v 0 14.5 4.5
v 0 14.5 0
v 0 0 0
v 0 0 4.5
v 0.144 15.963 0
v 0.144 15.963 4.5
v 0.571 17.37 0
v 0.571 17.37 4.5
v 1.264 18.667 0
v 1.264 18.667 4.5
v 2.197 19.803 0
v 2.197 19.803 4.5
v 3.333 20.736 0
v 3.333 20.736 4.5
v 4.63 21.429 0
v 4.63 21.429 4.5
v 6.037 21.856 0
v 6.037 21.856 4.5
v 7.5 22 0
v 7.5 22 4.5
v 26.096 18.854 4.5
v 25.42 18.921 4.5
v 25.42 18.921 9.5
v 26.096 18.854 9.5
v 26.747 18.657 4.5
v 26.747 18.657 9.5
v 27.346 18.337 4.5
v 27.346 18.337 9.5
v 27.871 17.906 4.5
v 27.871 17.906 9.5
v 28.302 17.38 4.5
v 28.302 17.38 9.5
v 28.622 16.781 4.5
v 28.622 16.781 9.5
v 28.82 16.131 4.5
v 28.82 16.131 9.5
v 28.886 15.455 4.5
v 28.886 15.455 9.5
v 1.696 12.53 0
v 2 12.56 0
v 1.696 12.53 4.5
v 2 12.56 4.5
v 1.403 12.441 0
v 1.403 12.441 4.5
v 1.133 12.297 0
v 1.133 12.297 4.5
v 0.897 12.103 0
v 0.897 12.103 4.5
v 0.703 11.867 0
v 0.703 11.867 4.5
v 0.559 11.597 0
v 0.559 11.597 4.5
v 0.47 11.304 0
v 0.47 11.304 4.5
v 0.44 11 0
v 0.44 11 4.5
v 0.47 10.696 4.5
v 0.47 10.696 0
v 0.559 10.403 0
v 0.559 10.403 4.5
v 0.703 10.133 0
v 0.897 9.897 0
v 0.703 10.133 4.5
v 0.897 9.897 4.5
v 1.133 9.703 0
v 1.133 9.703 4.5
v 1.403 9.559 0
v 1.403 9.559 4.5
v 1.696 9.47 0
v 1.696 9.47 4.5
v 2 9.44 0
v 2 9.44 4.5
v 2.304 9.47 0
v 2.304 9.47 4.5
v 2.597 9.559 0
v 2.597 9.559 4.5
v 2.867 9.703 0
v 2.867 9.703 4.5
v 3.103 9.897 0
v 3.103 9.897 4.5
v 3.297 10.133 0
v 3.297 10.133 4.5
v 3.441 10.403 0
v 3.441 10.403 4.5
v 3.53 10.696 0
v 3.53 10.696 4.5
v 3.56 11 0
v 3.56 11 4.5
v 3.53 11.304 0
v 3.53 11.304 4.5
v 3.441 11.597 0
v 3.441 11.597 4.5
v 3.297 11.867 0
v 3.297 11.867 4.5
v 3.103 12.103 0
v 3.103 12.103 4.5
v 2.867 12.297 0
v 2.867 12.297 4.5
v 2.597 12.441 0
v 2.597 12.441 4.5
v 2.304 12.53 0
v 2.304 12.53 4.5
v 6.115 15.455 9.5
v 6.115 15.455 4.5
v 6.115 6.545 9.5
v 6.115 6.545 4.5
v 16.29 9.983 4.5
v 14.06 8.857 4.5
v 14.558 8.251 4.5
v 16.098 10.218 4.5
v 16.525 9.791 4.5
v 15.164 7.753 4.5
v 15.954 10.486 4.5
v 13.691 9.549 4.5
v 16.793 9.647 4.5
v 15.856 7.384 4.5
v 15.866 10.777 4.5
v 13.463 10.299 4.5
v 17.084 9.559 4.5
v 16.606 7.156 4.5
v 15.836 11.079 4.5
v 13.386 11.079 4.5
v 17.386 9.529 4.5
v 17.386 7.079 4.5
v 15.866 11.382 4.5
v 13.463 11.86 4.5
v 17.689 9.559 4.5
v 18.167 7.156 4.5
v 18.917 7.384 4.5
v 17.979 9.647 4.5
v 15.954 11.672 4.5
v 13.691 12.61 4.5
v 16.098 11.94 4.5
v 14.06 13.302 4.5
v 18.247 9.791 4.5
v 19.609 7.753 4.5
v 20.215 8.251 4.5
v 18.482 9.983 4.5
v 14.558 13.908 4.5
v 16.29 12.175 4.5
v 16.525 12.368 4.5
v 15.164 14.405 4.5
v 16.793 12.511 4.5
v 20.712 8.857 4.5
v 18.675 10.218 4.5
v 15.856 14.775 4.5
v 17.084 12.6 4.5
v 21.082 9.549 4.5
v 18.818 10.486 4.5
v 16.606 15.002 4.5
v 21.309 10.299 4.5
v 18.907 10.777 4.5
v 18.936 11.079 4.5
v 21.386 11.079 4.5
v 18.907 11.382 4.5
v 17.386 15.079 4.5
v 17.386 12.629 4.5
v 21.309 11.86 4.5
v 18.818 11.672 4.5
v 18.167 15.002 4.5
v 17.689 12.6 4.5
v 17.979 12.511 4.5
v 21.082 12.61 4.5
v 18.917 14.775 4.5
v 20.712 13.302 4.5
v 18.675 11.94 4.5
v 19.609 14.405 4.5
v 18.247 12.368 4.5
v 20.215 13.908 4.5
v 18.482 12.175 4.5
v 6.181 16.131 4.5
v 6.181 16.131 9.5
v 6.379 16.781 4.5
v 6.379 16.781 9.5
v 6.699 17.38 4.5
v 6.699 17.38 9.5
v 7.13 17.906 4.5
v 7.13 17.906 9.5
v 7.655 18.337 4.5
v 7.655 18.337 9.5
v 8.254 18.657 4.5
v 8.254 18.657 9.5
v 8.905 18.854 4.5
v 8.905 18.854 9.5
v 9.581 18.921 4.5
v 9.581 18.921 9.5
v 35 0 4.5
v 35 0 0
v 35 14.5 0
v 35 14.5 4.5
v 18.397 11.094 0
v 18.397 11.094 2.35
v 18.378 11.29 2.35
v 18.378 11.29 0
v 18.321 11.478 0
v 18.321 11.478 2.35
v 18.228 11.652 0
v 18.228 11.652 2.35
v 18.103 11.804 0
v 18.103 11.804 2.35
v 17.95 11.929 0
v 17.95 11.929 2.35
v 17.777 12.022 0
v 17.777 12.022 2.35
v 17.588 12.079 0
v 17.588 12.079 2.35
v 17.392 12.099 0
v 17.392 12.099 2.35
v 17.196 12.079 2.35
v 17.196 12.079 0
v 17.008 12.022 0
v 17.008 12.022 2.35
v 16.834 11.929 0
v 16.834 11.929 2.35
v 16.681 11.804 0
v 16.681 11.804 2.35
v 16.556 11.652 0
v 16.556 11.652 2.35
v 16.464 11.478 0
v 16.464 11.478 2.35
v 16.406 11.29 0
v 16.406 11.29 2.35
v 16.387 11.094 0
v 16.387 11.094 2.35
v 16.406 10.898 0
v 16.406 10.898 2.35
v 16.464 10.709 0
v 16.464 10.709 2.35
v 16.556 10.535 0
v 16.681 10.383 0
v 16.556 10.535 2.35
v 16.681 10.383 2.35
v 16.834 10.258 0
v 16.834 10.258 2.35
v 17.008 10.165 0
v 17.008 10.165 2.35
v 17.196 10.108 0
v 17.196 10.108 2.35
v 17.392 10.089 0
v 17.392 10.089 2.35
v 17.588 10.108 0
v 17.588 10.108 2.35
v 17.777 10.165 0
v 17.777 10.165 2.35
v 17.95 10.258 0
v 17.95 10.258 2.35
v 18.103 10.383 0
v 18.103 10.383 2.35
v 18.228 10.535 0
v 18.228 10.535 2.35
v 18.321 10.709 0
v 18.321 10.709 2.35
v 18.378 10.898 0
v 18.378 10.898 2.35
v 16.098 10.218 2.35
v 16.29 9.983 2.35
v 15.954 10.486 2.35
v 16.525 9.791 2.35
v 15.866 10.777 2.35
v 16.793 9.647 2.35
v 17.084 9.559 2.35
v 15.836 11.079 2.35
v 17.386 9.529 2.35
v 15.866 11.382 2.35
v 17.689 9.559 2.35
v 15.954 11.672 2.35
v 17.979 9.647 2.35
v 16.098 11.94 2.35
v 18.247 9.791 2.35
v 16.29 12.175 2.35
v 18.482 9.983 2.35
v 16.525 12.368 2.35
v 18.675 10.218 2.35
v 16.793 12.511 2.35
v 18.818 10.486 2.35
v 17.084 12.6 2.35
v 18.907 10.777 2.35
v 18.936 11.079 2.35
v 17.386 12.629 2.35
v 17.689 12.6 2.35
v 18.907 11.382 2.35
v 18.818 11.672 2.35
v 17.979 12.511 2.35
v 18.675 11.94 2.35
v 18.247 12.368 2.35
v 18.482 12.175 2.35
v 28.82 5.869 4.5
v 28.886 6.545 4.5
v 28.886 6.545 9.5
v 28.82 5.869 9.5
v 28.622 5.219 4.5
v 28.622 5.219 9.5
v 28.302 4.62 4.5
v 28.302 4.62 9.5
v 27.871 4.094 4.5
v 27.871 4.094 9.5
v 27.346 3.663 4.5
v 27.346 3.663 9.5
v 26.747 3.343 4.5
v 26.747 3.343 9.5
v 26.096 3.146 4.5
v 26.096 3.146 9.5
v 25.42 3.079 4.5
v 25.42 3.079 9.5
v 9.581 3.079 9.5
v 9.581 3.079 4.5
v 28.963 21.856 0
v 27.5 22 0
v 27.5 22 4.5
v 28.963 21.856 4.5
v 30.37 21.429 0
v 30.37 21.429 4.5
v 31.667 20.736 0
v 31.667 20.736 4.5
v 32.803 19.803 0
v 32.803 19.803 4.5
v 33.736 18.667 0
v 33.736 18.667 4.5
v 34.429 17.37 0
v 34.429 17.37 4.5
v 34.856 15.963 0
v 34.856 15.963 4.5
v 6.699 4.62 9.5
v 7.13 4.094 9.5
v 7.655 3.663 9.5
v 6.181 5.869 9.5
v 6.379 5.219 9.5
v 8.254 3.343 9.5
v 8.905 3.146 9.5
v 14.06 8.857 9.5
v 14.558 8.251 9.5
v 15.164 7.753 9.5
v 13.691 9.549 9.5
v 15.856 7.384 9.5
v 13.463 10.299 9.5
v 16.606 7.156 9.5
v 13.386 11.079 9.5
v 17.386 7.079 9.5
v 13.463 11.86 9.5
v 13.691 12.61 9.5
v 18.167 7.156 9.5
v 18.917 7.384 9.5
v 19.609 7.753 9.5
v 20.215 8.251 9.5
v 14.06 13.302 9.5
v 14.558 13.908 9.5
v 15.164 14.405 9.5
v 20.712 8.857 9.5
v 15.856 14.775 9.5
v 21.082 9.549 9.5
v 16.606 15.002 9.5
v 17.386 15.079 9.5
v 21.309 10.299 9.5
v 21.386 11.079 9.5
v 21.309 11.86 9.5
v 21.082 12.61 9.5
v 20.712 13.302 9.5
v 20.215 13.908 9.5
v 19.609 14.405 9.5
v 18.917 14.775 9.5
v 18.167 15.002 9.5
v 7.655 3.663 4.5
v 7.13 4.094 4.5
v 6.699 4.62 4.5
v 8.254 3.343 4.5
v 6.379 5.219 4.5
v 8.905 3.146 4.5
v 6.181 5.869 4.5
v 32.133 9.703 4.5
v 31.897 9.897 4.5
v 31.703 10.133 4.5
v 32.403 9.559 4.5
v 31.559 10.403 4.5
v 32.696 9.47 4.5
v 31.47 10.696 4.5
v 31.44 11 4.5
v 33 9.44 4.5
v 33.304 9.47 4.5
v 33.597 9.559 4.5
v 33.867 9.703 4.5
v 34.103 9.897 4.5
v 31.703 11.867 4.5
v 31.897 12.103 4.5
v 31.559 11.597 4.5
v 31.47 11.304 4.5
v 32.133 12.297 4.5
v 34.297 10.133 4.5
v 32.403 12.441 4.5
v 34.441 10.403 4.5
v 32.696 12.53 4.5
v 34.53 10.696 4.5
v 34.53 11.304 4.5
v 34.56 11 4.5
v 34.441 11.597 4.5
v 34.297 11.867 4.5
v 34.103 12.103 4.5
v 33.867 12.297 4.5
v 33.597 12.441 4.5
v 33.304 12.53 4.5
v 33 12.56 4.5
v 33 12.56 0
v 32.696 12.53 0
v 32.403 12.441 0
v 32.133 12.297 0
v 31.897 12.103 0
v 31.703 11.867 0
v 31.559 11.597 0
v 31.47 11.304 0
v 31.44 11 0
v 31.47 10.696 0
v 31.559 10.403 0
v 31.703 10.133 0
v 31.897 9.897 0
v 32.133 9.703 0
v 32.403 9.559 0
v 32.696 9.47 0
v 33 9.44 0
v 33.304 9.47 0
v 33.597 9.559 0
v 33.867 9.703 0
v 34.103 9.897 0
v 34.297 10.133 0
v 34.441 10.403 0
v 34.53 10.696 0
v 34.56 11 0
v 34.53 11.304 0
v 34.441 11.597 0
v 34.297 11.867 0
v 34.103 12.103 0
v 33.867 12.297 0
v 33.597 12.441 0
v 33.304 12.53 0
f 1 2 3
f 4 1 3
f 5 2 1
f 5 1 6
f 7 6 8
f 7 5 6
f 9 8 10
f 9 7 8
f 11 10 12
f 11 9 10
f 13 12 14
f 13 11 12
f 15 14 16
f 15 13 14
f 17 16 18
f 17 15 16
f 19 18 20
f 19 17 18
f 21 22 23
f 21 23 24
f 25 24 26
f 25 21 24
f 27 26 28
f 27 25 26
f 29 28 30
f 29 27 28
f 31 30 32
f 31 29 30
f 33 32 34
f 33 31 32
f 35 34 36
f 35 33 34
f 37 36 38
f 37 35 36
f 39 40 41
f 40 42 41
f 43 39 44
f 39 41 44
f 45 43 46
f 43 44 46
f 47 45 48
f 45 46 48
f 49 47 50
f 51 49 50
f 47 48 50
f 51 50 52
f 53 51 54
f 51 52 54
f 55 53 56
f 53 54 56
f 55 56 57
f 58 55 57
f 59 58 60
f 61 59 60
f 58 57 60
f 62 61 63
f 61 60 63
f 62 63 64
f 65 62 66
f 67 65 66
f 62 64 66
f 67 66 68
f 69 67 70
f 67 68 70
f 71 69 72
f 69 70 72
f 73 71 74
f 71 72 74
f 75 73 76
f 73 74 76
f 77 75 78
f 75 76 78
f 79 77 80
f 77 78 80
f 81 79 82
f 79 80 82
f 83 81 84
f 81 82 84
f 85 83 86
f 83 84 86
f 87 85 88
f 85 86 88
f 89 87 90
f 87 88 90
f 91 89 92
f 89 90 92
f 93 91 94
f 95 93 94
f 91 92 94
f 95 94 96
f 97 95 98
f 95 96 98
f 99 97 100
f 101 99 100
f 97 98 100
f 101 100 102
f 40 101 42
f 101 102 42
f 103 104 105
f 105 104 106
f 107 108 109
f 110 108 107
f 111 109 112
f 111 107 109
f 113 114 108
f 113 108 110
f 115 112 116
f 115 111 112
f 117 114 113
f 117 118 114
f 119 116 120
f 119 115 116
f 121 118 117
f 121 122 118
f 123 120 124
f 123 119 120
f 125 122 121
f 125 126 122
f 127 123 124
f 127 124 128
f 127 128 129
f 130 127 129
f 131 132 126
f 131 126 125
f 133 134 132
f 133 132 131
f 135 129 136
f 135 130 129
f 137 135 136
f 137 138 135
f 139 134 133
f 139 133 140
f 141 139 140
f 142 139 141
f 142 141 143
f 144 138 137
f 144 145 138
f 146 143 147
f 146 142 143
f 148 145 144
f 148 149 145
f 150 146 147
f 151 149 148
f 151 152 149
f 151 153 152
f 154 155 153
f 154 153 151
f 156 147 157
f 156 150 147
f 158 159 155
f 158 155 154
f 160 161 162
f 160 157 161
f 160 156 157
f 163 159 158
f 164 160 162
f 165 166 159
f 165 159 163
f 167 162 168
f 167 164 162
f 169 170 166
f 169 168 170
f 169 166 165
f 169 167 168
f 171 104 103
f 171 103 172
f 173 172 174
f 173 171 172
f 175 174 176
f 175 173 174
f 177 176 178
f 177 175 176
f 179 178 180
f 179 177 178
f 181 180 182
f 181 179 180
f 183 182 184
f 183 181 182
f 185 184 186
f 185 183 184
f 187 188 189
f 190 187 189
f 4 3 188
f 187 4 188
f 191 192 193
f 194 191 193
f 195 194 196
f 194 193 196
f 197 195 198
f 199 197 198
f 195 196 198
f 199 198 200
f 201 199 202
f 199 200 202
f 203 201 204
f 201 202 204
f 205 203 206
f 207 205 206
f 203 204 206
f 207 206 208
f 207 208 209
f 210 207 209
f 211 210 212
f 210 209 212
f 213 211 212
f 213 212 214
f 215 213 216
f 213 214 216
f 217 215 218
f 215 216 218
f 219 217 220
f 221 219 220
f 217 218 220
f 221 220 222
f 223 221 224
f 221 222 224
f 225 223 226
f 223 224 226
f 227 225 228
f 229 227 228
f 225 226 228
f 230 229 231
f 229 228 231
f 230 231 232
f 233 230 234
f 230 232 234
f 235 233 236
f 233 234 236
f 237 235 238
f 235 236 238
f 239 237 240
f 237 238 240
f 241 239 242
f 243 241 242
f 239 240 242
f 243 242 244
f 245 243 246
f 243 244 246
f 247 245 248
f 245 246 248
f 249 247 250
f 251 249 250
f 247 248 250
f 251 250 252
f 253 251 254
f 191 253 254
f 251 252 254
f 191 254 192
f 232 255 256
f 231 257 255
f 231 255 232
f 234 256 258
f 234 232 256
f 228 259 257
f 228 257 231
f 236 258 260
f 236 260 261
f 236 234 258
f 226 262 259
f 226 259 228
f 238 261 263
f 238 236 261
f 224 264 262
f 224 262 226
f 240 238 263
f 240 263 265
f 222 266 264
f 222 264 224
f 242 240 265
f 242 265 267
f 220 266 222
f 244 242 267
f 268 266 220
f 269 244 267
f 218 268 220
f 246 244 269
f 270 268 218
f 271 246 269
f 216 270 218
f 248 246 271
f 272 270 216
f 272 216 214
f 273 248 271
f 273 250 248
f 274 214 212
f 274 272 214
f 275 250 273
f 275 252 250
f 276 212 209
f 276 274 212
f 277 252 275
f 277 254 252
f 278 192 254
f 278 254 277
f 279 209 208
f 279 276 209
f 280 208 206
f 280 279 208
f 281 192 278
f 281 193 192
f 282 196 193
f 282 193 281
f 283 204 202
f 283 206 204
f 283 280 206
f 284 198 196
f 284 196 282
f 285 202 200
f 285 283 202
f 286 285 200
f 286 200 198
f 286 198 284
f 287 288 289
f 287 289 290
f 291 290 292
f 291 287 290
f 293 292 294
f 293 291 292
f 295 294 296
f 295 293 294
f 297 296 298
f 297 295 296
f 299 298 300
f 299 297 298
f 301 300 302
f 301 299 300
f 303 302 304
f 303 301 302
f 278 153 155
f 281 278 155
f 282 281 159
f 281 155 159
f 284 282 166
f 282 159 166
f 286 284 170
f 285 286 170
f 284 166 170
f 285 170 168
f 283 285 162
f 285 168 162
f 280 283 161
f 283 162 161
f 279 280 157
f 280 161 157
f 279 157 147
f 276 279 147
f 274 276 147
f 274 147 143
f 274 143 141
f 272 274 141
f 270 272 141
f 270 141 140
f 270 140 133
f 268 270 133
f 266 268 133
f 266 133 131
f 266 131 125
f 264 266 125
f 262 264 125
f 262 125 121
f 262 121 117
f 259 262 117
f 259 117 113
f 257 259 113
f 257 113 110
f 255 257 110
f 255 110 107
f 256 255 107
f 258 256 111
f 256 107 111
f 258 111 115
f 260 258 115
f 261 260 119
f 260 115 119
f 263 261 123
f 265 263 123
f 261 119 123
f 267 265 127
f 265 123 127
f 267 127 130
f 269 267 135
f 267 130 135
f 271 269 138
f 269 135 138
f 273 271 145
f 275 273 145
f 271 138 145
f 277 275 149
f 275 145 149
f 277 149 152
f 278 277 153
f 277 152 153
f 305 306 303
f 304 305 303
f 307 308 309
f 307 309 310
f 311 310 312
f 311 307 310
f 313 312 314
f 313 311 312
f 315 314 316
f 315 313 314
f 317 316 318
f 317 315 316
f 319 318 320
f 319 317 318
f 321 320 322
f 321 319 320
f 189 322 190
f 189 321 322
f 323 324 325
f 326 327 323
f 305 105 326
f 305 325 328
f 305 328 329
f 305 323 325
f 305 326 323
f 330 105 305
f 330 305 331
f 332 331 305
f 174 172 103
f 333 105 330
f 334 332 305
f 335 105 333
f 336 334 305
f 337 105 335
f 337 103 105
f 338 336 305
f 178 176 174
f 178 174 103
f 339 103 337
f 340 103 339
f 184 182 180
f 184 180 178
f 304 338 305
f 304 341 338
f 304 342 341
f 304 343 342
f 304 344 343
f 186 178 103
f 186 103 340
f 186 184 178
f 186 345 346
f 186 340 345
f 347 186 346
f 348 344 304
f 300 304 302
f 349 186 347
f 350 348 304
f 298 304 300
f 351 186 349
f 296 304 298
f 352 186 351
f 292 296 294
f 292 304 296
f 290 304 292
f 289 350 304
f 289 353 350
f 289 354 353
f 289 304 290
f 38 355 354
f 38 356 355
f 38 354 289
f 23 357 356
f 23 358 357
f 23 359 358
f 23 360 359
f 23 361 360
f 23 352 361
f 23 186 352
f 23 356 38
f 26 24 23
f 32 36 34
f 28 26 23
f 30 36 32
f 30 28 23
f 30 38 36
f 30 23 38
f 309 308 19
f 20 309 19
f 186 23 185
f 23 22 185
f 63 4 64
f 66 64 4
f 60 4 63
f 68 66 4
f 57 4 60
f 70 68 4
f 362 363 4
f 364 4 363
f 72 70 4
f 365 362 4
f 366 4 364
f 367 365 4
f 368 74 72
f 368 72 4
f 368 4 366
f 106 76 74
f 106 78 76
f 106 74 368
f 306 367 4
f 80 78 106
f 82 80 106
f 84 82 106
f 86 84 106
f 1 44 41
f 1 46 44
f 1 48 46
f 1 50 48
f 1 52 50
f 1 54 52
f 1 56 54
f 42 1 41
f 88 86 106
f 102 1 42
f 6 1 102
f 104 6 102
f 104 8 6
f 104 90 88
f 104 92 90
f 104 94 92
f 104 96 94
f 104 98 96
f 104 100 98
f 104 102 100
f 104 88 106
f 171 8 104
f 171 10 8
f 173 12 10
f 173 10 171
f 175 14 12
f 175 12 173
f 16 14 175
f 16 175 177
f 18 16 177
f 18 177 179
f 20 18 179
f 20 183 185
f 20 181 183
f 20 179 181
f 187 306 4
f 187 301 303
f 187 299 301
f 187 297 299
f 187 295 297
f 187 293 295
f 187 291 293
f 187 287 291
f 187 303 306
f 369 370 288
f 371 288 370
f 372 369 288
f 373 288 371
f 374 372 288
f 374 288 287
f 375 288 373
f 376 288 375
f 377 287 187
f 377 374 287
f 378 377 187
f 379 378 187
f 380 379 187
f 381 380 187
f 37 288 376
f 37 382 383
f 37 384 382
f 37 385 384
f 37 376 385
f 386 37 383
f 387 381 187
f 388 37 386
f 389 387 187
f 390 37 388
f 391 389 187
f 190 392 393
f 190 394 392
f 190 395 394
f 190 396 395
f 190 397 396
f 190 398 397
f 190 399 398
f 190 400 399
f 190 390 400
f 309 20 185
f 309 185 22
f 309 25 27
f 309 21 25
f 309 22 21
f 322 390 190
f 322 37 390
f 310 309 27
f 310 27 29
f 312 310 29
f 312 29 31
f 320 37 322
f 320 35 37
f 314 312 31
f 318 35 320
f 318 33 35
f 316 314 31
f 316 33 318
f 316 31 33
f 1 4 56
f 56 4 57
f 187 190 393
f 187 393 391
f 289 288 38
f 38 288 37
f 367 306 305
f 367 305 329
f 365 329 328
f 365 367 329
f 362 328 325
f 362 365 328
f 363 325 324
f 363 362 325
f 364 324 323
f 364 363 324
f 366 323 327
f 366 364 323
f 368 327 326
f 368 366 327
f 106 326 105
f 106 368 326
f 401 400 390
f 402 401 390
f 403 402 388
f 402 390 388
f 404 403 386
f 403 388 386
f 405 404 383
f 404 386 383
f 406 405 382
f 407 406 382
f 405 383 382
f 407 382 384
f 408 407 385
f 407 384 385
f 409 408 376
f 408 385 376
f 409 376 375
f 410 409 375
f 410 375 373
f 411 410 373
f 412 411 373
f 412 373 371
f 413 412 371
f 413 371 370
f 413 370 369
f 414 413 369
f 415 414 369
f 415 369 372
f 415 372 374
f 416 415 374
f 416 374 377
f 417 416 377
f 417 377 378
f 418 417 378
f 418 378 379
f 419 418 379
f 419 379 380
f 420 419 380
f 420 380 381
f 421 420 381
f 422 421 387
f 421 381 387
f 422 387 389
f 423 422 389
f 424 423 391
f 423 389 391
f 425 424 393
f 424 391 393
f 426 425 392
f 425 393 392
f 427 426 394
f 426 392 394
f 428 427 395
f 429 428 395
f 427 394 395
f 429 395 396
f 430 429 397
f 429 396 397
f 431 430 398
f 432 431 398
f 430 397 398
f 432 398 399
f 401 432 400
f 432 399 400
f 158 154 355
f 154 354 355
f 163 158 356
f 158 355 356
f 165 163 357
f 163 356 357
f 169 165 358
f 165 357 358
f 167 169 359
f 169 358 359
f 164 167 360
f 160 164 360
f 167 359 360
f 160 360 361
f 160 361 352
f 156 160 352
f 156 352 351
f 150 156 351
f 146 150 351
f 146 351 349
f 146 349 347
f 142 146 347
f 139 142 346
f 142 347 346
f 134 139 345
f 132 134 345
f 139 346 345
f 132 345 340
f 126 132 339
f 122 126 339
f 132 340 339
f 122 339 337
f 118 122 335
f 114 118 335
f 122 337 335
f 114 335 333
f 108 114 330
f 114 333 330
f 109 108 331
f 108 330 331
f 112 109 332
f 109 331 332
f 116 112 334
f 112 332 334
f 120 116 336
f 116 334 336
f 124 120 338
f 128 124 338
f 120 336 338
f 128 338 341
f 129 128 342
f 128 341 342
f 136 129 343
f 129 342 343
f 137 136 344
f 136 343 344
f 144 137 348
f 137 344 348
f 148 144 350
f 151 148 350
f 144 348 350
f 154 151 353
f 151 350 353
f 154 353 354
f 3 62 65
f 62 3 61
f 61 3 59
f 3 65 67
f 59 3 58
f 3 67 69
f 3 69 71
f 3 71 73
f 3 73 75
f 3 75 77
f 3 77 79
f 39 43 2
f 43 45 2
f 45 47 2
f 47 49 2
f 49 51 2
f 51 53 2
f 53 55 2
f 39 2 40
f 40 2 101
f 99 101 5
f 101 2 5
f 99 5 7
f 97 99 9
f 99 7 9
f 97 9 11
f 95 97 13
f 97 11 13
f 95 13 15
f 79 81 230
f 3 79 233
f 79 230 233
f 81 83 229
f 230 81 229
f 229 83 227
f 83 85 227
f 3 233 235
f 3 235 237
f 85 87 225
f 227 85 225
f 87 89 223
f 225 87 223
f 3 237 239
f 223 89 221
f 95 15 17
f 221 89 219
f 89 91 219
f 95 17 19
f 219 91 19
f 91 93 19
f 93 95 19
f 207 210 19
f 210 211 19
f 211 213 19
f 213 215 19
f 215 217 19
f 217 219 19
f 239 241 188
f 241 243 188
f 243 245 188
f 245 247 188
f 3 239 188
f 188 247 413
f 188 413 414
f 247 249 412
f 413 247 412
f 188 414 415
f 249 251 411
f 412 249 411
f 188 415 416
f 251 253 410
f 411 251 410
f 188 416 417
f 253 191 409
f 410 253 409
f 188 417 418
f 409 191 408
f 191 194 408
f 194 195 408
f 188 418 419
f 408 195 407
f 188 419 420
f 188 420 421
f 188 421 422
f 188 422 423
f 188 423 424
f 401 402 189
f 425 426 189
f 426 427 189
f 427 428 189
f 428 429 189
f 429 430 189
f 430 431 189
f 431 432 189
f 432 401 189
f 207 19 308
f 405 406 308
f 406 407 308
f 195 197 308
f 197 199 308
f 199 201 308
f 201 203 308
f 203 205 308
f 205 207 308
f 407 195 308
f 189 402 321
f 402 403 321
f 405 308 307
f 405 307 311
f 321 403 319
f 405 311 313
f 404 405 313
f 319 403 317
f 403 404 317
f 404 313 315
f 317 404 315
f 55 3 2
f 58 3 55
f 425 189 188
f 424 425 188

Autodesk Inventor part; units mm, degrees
ref_plane "YZ Plane" through (0, 0, 0) normal (1, 0, 0) x (0, 1, 0)
ref_plane "XZ Plane" through (0, 0, 0) normal (0, 1, 0) x (-1, 0, 0)
ref_plane "XY Plane" through (0, 0, 0) normal (0, 0, 1) x (1, 0, 0)
sketch "Sketch1" plane through (0, 0, 0) normal (0, 0, 1) x (1, 0, 0)
  line L0 (0, 0) -> (35, 0)
  line L1 (35, 0) -> (35, 14.5)
  line L2 (27.5, 22) -> (7.5, 22)
  line L3 (0, 14.5) -> (0, 0)
  arc A0 (7.5, 22) -> (0, 14.5) centre (7.5, 14.5) ccw
  arc A1 (35, 14.5) -> (27.5, 22) centre (27.5, 14.5) ccw
  point P0 (35, 22)
  point P1 (0, 22)
  dimension "d0" = 35
  dimension "d1" = 22
  dimension "d2" = 7.5
extrude "Extrusion1" add sketch "Sketch1" along normal blind 4.5
sketch "Sketch2" plane through (0, 0, 4.5) normal (0, 0, 1) x (1, 0, 0)
  line L0 (9.5807, 3.0793) -> (25.4203, 3.0793)
  line L1 (28.8863, 6.5453) -> (28.8863, 15.4547)
  line L2 (25.4203, 18.9207) -> (9.5807, 18.9207)
  line L3 (6.1147, 15.4547) -> (6.1147, 6.5453)
  arc A0 (9.5807, 18.9207) -> (6.1147, 15.4547) centre (9.5807, 15.4547) ccw
  arc A1 (28.8863, 15.4547) -> (25.4203, 18.9207) centre (25.4203, 15.4547) ccw
  arc A2 (25.4203, 3.0793) -> (28.8863, 6.5453) centre (25.4203, 6.5453) ccw
  arc A3 (6.1147, 6.5453) -> (9.5807, 3.0793) centre (9.5807, 6.5453) ccw
  line L4 (35, 0) -> (35, 14.5) projected
  line L5 (0, 0) -> (35, 0) projected
  line L6 (0, 14.5) -> (0, 0) projected
  line L7 (27.5, 22) -> (7.5, 22) projected
  point P0 (29, 19)
  point P1 (29, 3)
  point P2 (6, 19)
  dimension "d5" = 23
  dimension "d6" = 16
  dimension "d7" = 3.466
  dimension "d8" = 3.466
  dimension "d9" = 6.1137
  dimension "d10" = 3.0793
  dimension "d49" = 6.1147
  dimension "d50" = 3.0793
extrude "Extrusion2" add sketch "Sketch2" along normal blind 5
sketch "Sketch3" plane through (0, 0, 0) normal (0, 0, -1) x (-1, 0, 0)
  circle A0 centre (-2, 11) radius 1.56
  circle A1 centre (-33, 11) radius 1.56
  line L0 (0, 14.5) -> (0, 0) projected
  line L1 (0, 0) -> (-35, 0) projected
  dimension "d13" = 3.12
  dimension "d14" = 3.12
  dimension "d18" = 2
  dimension "d19" = 31
  dimension "d20" = 11
  dimension "d21" = 11
hole "Hole1" at (2, 11, 0) direction (0, 0, 1) diameter 3.12 end through all
hole "Hole2" at (33, 11, 0) direction (0, 0, 1) diameter 3.12 end through all
sketch "Sketch4" plane through (0, 0, 9.5) normal (0, 0, 1) x (1, 0, 0)
  circle A0 centre (17.3863, 11.0793) radius 4
  line L0 (28.8863, 6.5453) -> (28.8863, 15.4547) projected
  line L1 (9.5807, 3.0793) -> (25.4203, 3.0793) projected
  point P0 (0, 0)
  dimension "d36" = 8
  dimension "d37" = 11.5
  dimension "d38" = 8
extrude "Extrusion3" cut sketch "Sketch4" against normal blind 5
sketch "Sketch5" plane through (17.3863, 11.0793, 4.5) normal (0, 0, 1) x (1, 0, 0)
  circle A0 centre (0, 0) radius 1.55
  circle A1 centre (0, 0) radius 4 projected
  point P0 (-17.3863, -11.0793)
  dimension "d41" = 3.1
  dimension "d42" = 2.45
extrude "Extrusion4" cut sketch "Sketch5" against normal blind 2.15 contours A0
sketch "Sketch6" plane through (17.3863, 11.0793, 2.35) normal (0, 0, 1) x (1, 0, 0)
  circle A0 centre (0.0058, 0.0144) radius 1.005
  circle A1 centre (0, 0) radius 1.55 projected
  point P0 (-17.3863, -11.0793)
  dimension "d45" = 2.01
  dimension "d46" = 0.5295
extrude "Extrusion5" cut sketch "Sketch6" against normal through all contours A0
properties part number "Aquamote3.2_housing_cap"
